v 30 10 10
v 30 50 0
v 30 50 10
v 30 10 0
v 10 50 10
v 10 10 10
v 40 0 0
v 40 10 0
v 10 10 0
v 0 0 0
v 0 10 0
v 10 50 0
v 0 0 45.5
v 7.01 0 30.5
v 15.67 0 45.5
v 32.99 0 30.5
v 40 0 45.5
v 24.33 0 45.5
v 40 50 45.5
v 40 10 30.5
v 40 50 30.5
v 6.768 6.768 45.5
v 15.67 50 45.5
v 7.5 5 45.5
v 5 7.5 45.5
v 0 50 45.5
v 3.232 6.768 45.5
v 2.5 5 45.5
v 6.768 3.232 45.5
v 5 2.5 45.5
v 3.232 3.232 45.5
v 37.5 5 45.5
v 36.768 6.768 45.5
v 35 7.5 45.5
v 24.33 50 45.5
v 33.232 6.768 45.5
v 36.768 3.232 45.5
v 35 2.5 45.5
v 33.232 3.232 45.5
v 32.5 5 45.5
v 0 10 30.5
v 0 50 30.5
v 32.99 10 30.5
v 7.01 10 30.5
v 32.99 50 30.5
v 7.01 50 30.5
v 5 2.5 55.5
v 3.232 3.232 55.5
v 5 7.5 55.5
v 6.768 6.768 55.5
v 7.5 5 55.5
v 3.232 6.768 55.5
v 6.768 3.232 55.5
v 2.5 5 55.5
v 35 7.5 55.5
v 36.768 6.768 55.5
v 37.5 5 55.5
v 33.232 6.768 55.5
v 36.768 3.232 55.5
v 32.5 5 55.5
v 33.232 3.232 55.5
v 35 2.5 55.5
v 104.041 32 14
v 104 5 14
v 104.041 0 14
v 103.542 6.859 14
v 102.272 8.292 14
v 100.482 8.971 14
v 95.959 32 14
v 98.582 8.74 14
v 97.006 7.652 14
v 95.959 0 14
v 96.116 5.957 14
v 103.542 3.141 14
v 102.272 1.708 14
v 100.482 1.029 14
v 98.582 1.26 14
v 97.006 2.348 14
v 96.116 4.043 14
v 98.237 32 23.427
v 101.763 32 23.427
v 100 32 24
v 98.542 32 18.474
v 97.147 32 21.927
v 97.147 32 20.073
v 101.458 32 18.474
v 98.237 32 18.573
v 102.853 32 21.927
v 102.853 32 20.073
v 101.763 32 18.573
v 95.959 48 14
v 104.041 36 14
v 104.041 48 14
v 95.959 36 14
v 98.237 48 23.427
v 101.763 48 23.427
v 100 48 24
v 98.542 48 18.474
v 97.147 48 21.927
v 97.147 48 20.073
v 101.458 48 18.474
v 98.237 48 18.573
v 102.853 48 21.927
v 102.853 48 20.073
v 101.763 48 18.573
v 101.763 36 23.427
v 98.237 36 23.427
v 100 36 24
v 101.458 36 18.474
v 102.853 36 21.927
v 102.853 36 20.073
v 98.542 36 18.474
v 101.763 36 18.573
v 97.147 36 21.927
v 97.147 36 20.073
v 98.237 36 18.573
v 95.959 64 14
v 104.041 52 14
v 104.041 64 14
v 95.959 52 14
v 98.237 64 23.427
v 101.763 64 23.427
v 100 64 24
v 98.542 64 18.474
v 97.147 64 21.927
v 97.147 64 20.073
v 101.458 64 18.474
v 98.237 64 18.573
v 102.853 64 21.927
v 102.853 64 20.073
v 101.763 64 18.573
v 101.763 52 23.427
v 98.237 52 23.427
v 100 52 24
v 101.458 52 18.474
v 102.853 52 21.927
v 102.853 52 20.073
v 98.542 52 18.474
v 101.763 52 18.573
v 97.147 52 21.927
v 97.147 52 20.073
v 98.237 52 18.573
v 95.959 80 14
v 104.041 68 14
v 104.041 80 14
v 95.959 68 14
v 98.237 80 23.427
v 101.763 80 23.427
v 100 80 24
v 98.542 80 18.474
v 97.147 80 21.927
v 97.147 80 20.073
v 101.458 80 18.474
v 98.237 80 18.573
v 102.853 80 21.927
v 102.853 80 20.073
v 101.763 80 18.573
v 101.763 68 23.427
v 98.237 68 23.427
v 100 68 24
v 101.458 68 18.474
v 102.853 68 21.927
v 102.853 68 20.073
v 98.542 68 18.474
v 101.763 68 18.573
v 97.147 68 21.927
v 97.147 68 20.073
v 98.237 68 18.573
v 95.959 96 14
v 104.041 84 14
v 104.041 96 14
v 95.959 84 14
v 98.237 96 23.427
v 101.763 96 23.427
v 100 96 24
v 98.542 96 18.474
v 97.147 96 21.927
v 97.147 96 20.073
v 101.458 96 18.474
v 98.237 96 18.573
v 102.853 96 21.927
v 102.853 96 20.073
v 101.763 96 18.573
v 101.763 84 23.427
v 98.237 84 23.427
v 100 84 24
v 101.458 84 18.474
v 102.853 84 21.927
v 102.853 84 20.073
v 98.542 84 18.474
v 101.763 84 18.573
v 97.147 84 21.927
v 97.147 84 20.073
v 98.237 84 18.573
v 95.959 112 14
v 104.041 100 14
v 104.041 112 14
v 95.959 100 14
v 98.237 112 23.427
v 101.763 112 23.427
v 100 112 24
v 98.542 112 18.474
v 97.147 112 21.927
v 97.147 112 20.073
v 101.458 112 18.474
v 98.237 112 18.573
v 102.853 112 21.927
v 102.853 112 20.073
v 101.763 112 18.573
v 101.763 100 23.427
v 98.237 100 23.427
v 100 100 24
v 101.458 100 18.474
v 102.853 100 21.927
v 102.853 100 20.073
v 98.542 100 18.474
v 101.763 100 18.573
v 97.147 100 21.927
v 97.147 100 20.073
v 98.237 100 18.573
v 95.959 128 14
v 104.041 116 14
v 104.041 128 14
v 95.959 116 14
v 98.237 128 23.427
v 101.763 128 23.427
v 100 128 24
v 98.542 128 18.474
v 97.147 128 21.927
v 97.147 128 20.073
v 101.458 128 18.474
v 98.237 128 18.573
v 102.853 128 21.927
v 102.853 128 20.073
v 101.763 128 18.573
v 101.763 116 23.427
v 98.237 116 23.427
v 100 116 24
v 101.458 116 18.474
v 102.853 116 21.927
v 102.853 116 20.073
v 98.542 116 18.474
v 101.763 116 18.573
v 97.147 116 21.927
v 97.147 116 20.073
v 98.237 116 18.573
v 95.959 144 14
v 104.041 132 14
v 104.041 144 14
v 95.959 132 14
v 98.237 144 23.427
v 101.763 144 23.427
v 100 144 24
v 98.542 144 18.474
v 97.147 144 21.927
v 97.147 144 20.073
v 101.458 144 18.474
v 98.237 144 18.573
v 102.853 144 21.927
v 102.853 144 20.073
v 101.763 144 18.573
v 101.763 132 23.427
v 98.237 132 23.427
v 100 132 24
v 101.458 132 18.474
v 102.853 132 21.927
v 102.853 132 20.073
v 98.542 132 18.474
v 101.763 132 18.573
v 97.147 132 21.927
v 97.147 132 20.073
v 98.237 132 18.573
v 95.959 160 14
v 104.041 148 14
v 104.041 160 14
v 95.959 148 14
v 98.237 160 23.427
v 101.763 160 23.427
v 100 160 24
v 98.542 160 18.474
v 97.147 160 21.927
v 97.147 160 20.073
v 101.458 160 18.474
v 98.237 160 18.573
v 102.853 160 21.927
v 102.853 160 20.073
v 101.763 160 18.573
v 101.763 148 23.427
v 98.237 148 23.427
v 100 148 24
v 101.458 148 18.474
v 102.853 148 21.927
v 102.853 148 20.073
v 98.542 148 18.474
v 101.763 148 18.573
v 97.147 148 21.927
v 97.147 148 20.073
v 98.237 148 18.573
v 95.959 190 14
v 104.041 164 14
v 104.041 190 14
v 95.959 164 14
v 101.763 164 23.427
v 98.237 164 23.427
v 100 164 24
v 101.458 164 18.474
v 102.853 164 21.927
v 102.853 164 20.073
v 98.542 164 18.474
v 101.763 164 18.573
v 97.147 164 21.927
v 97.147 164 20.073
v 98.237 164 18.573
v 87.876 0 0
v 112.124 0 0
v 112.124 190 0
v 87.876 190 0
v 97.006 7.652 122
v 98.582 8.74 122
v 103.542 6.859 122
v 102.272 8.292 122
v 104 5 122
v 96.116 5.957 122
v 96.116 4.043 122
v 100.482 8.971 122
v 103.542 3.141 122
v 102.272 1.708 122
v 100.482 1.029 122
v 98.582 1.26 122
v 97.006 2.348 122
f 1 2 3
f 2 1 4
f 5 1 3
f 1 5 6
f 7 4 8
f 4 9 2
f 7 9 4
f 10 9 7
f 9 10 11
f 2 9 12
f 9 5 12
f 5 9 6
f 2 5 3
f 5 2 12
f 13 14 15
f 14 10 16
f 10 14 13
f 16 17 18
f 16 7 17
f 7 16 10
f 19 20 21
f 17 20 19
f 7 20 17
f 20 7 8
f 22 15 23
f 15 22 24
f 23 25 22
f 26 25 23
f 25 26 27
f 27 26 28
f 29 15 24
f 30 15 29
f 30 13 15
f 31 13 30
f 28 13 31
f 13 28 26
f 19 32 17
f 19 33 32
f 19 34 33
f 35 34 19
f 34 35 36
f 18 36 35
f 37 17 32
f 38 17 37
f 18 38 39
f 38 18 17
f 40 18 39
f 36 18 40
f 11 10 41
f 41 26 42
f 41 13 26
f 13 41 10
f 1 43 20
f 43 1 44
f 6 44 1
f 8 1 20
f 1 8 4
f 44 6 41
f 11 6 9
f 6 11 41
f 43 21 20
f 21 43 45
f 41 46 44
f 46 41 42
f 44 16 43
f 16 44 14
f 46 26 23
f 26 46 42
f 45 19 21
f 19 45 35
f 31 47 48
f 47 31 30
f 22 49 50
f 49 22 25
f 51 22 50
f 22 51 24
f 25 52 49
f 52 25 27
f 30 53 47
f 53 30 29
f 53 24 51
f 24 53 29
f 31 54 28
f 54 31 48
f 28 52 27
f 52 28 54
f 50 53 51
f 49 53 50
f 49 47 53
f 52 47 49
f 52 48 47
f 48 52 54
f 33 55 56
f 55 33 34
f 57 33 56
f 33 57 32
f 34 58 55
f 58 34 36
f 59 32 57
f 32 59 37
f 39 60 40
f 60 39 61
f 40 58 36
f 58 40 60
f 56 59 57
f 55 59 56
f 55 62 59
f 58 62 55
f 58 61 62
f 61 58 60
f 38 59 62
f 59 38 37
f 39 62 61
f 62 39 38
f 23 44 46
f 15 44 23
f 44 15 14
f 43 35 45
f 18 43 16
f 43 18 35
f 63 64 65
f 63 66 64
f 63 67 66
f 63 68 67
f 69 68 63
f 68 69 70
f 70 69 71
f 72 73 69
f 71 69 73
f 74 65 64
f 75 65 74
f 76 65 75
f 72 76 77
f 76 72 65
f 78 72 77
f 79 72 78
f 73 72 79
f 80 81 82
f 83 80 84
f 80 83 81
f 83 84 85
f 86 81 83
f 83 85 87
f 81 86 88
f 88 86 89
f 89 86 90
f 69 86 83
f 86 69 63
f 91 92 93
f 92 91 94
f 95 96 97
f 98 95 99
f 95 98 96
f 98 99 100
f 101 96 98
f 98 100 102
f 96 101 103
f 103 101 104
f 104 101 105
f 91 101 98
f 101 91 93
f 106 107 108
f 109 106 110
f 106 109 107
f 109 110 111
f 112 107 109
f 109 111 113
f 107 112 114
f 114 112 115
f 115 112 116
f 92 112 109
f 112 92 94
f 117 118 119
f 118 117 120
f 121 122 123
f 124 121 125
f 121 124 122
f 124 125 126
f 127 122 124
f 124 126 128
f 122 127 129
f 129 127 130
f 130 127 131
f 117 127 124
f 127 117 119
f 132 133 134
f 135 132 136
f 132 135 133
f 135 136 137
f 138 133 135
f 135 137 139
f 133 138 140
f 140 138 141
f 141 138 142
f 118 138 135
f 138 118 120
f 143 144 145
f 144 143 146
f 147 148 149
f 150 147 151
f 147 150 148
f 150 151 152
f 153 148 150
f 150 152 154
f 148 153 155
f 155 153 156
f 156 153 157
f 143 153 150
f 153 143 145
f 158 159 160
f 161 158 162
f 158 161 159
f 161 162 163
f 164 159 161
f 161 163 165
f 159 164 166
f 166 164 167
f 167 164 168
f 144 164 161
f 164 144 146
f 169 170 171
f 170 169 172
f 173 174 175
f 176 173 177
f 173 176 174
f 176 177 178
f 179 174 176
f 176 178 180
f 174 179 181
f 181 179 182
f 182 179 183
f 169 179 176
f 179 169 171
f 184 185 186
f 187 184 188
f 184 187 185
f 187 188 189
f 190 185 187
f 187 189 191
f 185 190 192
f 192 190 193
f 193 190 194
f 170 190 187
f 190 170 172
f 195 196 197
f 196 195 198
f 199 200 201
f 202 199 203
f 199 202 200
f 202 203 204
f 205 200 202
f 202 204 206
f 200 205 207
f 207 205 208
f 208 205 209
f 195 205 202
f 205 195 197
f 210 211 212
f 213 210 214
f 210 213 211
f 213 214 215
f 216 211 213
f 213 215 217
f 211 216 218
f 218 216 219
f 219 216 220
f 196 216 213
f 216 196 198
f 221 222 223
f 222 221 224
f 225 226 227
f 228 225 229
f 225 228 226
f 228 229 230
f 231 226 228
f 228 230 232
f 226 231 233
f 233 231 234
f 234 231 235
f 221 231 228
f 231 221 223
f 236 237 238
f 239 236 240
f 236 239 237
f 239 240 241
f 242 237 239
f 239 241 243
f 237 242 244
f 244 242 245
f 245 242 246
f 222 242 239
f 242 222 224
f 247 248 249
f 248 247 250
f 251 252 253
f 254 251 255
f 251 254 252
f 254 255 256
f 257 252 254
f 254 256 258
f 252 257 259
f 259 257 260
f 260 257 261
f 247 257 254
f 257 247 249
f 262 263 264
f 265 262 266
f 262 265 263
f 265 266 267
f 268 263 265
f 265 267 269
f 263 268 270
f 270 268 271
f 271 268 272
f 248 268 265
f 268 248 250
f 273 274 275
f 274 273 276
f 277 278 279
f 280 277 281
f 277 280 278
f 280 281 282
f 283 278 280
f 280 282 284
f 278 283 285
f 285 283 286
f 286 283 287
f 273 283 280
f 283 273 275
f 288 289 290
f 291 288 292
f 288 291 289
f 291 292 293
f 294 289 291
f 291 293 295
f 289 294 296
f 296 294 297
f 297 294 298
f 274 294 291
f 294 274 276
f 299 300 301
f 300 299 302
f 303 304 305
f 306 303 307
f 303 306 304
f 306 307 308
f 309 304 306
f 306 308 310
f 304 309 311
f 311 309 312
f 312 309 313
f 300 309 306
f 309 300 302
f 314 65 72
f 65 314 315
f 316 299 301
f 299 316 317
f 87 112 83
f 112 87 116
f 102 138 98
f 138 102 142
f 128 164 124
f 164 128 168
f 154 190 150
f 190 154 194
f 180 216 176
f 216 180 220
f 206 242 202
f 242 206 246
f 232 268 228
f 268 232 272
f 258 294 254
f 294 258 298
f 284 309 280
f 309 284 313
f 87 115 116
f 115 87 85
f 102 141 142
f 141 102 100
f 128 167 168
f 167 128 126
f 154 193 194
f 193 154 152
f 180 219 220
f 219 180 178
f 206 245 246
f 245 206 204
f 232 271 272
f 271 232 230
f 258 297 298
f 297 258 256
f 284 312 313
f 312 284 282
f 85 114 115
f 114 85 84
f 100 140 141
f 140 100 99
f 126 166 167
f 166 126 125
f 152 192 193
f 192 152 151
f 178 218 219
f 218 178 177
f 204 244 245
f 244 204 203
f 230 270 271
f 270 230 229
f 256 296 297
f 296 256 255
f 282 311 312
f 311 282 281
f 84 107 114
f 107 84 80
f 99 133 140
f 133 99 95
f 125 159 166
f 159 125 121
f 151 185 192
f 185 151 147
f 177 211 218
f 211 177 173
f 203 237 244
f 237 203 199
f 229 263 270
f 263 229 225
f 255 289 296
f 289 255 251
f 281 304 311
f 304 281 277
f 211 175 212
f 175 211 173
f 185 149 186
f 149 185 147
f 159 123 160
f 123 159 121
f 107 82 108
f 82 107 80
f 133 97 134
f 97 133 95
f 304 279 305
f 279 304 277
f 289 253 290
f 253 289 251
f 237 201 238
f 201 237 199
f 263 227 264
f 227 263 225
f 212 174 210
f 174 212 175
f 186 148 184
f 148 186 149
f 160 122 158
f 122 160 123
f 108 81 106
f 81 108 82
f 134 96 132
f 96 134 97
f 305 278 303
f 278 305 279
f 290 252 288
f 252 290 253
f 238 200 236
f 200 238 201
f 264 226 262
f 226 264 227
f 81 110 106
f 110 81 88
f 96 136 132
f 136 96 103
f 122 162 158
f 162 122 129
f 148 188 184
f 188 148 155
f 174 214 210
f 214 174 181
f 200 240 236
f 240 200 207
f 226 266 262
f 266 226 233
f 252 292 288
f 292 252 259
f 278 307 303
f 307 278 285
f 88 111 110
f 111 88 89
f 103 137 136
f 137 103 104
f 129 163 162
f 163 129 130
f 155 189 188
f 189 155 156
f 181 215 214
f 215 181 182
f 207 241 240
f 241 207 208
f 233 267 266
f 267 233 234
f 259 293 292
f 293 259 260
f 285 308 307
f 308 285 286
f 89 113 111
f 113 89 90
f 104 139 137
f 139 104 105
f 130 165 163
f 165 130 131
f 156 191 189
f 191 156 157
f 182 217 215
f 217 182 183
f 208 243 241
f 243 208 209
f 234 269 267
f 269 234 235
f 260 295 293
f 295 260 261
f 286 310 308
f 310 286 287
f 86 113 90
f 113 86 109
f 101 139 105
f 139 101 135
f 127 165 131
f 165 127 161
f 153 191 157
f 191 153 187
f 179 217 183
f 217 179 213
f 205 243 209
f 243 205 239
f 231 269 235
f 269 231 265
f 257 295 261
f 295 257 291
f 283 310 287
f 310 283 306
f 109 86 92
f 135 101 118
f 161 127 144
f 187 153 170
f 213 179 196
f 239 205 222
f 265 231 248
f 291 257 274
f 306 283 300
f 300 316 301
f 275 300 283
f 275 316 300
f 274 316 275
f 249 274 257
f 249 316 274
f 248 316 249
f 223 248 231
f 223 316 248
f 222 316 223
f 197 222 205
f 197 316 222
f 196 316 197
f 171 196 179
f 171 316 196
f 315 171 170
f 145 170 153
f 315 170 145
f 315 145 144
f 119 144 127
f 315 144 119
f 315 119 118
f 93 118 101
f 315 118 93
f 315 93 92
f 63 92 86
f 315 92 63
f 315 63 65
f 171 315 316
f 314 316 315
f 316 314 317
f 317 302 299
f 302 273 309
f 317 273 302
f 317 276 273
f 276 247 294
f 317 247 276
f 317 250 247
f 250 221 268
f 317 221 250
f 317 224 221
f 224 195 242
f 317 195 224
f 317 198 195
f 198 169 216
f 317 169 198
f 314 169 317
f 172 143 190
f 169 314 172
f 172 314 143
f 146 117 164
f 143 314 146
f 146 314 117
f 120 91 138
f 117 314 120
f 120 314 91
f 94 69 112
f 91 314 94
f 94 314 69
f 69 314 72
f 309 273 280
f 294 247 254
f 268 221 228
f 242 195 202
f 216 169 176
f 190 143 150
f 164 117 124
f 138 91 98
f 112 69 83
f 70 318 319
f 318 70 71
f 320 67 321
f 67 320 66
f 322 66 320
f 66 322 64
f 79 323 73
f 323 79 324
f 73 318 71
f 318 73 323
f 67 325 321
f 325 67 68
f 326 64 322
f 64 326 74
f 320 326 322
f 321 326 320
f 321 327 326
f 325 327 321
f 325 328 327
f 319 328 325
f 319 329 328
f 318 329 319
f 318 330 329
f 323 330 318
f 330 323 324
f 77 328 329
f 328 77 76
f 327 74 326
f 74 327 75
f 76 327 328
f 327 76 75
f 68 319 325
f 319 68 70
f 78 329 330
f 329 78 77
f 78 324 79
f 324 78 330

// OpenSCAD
// ping pong net sysytem using rubberbands for tension

table_thickness = 20.5;
length = 50;
clamp = true;
rail=true;

if (clamp) {
    difference() {
        union() {
            // thumb
            translate([10, 0, 0]) {
                cube([20, length, 10]);
            }
            
            // back
            cube([40, 10, 10 + table_thickness + 15]);

            // top
            translate([0, 0, 10 + table_thickness]) {
                cube([40, length, 15]);
            }
            
            // hooks
            translate([5, 5, 10 + table_thickness + 15]) {
                cylinder(r=2.5,h=10);
            }
            translate([40-5, 5, 10 + table_thickness + 15]) {
                cylinder(r=2.5,h=10);
            }
        }
        translate([20,0, 7.5+10 + table_thickness]) {
            rotate([270,0,0]) {
                linear_extrude(height = length) {
                    rotate(270) {
                        circle(15,$fn=3);
                    }
                }
            }
        }
    }
}

// rail
if (rail) {
    translate([100,0,7]) {
        difference() {
            rotate([270,0,0]) {
                linear_extrude(height = 190) {
                    rotate(270) {
                        circle(14,$fn=3);
                        translate([14, 0, 0]) {
                            circle(3);
                        }
                    }
                }
            }

            translate([-7,0,7]) {
                cube([14, 20, 10]);
            }
            translate([-7,190-20,7]) {
                cube([14, 20, 10]);
            }
            
            for (x=[20:16:190-20]) {
                translate([-7,x,7]) {
                    cube([14, 12, 10]);
                }
            }
        }
      
        // post
        translate([0,5,0]) {
            cylinder(r=4, h=115);
        }
    }
}
